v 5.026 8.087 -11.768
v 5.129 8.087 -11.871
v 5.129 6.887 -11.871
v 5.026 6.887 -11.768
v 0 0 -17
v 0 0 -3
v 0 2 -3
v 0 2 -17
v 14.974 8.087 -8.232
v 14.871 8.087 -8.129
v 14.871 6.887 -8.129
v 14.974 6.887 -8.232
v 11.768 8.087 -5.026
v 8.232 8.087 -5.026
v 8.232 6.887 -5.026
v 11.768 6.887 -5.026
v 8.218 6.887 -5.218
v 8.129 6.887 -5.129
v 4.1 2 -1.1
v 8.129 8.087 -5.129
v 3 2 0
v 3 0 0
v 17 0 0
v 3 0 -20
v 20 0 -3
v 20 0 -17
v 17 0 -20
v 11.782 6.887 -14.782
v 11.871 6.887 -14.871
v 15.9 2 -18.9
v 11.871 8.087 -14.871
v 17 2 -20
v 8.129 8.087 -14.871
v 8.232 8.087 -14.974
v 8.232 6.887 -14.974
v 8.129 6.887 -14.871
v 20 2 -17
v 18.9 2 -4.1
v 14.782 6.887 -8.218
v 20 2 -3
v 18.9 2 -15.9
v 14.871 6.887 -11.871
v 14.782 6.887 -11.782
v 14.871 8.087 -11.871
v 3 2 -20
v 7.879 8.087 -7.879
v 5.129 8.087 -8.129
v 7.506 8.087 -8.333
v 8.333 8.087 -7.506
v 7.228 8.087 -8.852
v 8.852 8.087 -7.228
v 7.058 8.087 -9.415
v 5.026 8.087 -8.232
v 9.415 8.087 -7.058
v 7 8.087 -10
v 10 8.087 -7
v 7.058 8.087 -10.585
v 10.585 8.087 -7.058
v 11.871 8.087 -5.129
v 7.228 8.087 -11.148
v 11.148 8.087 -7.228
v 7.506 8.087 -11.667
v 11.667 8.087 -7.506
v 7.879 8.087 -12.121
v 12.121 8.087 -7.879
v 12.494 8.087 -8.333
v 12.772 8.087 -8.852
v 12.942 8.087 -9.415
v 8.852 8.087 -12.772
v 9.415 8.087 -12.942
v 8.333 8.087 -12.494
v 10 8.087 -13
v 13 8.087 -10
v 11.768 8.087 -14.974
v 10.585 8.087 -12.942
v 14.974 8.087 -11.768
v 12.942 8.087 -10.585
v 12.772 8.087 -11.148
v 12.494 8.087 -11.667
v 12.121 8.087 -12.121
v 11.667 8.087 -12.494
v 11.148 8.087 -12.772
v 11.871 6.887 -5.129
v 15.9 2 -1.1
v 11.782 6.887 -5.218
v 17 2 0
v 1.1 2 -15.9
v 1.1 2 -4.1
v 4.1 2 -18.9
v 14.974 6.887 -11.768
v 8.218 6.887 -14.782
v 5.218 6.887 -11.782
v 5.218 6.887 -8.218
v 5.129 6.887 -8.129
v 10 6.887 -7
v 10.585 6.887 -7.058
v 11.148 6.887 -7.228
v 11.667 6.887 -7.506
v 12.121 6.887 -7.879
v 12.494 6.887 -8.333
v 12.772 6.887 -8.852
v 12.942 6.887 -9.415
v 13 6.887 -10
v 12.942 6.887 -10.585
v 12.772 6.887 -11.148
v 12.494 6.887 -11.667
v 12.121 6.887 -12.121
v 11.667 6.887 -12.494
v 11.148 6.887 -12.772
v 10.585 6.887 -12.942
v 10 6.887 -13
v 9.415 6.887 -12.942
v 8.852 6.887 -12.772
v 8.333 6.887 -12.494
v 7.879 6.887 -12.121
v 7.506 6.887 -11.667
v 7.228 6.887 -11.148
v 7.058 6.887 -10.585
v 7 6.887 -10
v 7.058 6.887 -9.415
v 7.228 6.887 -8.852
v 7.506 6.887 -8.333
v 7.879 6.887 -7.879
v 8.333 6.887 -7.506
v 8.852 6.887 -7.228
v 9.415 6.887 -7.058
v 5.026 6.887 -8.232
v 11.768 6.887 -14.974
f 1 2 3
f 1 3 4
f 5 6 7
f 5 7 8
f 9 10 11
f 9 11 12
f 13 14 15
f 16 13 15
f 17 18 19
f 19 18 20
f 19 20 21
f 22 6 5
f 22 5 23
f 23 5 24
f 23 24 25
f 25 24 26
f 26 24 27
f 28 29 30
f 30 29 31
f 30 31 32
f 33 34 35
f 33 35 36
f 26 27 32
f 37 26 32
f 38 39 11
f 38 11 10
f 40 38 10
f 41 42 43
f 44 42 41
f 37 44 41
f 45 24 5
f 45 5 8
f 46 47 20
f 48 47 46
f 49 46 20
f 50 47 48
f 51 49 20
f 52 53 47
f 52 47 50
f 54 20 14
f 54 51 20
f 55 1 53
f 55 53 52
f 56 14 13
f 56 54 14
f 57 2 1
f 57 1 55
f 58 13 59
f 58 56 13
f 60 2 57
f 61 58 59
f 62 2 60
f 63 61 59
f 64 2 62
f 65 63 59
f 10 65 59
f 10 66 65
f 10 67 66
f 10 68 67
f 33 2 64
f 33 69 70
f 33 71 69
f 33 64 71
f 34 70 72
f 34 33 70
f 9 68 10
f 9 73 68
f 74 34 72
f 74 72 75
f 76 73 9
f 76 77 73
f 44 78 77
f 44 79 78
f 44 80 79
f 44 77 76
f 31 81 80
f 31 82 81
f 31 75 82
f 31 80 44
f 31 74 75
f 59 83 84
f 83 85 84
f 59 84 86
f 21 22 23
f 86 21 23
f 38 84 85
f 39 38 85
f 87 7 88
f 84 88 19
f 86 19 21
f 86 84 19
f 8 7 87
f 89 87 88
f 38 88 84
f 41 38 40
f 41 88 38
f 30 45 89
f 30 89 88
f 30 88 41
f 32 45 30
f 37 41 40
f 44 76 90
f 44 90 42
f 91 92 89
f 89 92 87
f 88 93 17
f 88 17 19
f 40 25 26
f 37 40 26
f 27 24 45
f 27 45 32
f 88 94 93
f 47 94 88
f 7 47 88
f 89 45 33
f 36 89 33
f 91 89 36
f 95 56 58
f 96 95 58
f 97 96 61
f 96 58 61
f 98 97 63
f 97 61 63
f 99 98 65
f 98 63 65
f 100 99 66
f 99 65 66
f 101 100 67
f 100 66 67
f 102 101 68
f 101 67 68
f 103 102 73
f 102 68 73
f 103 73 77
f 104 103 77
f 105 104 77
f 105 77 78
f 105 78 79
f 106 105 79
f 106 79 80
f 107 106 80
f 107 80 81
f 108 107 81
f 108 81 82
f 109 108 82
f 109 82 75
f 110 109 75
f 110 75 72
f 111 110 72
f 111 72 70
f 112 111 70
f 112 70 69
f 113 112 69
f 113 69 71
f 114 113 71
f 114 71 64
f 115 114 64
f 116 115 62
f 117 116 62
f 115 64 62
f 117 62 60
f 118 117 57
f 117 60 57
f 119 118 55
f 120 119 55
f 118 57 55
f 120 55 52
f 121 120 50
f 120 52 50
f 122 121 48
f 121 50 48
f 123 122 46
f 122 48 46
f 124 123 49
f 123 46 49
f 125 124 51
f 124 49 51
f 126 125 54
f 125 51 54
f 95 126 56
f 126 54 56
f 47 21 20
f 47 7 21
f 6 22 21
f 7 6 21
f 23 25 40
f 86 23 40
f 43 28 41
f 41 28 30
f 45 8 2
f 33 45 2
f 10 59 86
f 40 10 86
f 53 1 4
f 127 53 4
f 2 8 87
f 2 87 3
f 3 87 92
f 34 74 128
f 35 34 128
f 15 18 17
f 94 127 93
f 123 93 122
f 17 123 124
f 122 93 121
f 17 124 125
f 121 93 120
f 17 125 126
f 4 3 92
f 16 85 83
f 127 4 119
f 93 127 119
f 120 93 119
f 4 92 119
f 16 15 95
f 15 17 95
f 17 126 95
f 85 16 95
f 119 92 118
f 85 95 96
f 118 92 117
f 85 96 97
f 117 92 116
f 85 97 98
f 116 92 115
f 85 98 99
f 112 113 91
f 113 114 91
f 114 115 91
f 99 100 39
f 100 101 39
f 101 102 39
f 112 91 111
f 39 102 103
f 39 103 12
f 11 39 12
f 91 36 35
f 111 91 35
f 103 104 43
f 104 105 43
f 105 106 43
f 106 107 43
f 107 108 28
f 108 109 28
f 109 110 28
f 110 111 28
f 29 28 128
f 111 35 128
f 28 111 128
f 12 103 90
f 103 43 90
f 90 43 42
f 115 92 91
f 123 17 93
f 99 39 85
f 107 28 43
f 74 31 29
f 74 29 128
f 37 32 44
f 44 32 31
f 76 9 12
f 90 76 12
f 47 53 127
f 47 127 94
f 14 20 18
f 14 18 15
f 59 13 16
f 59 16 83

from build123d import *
from build123d.topology import SkipClean

# Parameters (mm, degrees)
SKETCH1_W               = 20
SKETCH1_H               = 20
BOSS_EXTRUDE1_DEPTH     = 2
CHAMFER1_SIZE           = 3
EXTRUDE_THIN1_DEPTH     = 14.142136
CUT_EXTRUDE1_DEPTH      = 9.899495
CIRPATTERN5_START       = -2.121320344
CIRPATTERN5_DEPTH       = 4.242640688
CIRPATTERN5_START_2     = 12.02081528
CIRPATTERN5_2_DEPTH     = 4.242640687
CIRPATTERN5_START_3     = 2.121320344
CIRPATTERN5_3_OUTLINE_W = 4.242640688
CIRPATTERN5_3_OUTLINE_H = 2
CIRPATTERN5_3_DEPTH     = 9.899494936
SKETCH7_W               = 24.04163056
SKETCH7_H               = 24.04163056
CUT_EXTRUDE2_DEPTH      = 4
BOSS_EXTRUDE2_DEPTH     = 1.2
CHAMFER5_SIZE           = 2.5
CUT_EXTRUDE3_REACH      = 31.418
SKETCH10_R              = 3


with BuildPart() as part:
    # Sketch1 → Boss-Extrude1 (new body)
    with BuildSketch(Plane(origin=(0, 0, 0), x_dir=(1, 0, 0), z_dir=(0, 1, 0))):
        with Locations((10, 10)):
            Rectangle(SKETCH1_W, SKETCH1_H)
    extrude(amount=BOSS_EXTRUDE1_DEPTH)

    # Chamfer1
    chamfer1_edges = [part.edges().sort_by_distance(p)[0] for p in [
        (0, 1, -20),
        (20, 1, -20),
        (20, 1, 0),
        (0, 1, 0),
    ]]
    chamfer(chamfer1_edges, length=CHAMFER1_SIZE)



with BuildPart() as body_2:
    # Sketch3 → Extrude-Thin1 (new body)
    with BuildSketch(Plane(origin=(-8.5, 0, -8.5), x_dir=(-0.7071067811865488, 0, 0.7071067811865464), z_dir=(-0.7071067811865464, 0, -0.7071067811865488))):
        Polygon((-2.121320344, 2), (-14.142135624, 12.086661668), (-14.784923233, 11.320617225), (-2.764107953, 1.233955557), align=None)
    extrude(amount=-EXTRUDE_THIN1_DEPTH)

    # Sketch5 → Cut-Extrude1 (cut)
    with BuildSketch(Plane(origin=(-8.5, 0, -8.5), x_dir=(-0.7071067811865488, 0, 0.7071067811865462), z_dir=(-0.7071067811865462, 0, -0.7071067811865488))):
        Polygon((-2.121320344, 2), (-14.142135624, 12.086661668), (-14.784923233, 11.320617225), (-2.764107953, 1.233955557), align=None)
    extrude(amount=-CUT_EXTRUDE1_DEPTH, mode=Mode.SUBTRACT)


with BuildPart() as part_1:
    # CirPattern5: read off the stored shape, not the designer's step
    with SkipClean():  # the faces are left unmerged after this step: merging them gives an invalid solid
        add(part.part)

        add(body_2.part)  # CirPattern5 merges body 2
        # CirPattern5 outline → CirPattern5 (add)
        with BuildSketch(Plane(origin=(0, 0, 0), x_dir=(0.707106781186549, 0, -0.707106781186546), z_dir=(0.707106781186546, 0, 0.707106781186549)).offset(CIRPATTERN5_START)):
            Polygon((14.142135624, 10.781254379), (24.607227077, 2), (26.162950904, 2), (16.263455967, 10.306662551), (14.142135624, 12.086661668), (14.784923233, 11.320617225), align=None)
        extrude(amount=CIRPATTERN5_DEPTH)

    # CirPattern5 2 outline → CirPattern5 2 (add)
    with SkipClean():  # the faces are left unmerged after this step: merging them gives an invalid solid
        with BuildSketch(Plane(origin=(0, 0, 0), x_dir=(0.7071067811865541, 0, 0.707106781186541), z_dir=(0.707106781186541, 0, -0.707106781186554)).offset(CIRPATTERN5_START_2)):
            Polygon((0, -10.781254379), (-10.465091453, -2), (-12.02081528, -2), (-2.121320344, -10.30666255), (0, -12.086661668), (2.121320344, -10.30666255), (12.02081528, -2), (10.465091453, -2), align=None)
        extrude(amount=CIRPATTERN5_2_DEPTH)

    # CirPattern5 3 outline → CirPattern5 3 (add)
    with SkipClean():  # the faces are left unmerged after this step: merging them gives an invalid solid
        with BuildSketch(Plane(origin=(0, 0, 0), x_dir=(0.7071067811865541, 0, 0.707106781186541), z_dir=(0.707106781186541, 0, -0.707106781186554)).offset(CIRPATTERN5_START_3)):
            with Locations((0, -1)):
                Rectangle(CIRPATTERN5_3_OUTLINE_W, CIRPATTERN5_3_OUTLINE_H)
        extrude(amount=CIRPATTERN5_3_DEPTH)

    # Sketch7 → Cut-Extrude2 (cut)
    with BuildSketch(Plane(origin=(0, 12.086661668, 0), x_dir=(-0.7071067811865464, 0, -0.7071067811865488), z_dir=(0, 1, 0))):
        with Locations((0, -14.142135624)):
            Rectangle(SKETCH7_W, SKETCH7_H)
    extrude(amount=-CUT_EXTRUDE2_DEPTH, mode=Mode.SUBTRACT)

    # Sketch9 → Boss-Extrude2 (add)
    with BuildSketch(Plane(origin=(0, 8.086661668, 0), x_dir=(1, 0, 0), z_dir=(0, 1, 0))):
        Polygon((10, 16.741576375), (3.258423625, 10), (10, 3.258423625), (16.741576375, 10), align=None)
    extrude(amount=-BOSS_EXTRUDE2_DEPTH)

    # Chamfer5
    chamfer5_edges = [part_1.edges().sort_by_distance(p)[0] for p in [
        (10, 7.486661668, -3.258423625),
        (10, 7.486661668, -16.741576375),
        (16.741576375, 7.486661668, -10),
        (3.258423625, 7.486661668, -10),
    ]]
    chamfer(chamfer5_edges, length=CHAMFER5_SIZE)

    # Sketch10 → Cut-Extrude3 (cut, up to next)
    with BuildSketch(Plane(origin=(0, 8.086661668, 0), x_dir=(1, 0, 0), z_dir=(0, 1, 0)), mode=Mode.PRIVATE) as cut_extrude3_sk1:
        with Locations(Location((10, 10, 0), (0, 0, 270))):
            Circle(SKETCH10_R)
    cut_extrude3_tool1 = extrude(cut_extrude3_sk1.sketch, amount=-CUT_EXTRUDE3_REACH, mode=Mode.PRIVATE) & part_1.part
    add(cut_extrude3_tool1.solids().sort_by_distance((10, 8.086662, -10))[0], mode=Mode.SUBTRACT)


solid = part_1.part
